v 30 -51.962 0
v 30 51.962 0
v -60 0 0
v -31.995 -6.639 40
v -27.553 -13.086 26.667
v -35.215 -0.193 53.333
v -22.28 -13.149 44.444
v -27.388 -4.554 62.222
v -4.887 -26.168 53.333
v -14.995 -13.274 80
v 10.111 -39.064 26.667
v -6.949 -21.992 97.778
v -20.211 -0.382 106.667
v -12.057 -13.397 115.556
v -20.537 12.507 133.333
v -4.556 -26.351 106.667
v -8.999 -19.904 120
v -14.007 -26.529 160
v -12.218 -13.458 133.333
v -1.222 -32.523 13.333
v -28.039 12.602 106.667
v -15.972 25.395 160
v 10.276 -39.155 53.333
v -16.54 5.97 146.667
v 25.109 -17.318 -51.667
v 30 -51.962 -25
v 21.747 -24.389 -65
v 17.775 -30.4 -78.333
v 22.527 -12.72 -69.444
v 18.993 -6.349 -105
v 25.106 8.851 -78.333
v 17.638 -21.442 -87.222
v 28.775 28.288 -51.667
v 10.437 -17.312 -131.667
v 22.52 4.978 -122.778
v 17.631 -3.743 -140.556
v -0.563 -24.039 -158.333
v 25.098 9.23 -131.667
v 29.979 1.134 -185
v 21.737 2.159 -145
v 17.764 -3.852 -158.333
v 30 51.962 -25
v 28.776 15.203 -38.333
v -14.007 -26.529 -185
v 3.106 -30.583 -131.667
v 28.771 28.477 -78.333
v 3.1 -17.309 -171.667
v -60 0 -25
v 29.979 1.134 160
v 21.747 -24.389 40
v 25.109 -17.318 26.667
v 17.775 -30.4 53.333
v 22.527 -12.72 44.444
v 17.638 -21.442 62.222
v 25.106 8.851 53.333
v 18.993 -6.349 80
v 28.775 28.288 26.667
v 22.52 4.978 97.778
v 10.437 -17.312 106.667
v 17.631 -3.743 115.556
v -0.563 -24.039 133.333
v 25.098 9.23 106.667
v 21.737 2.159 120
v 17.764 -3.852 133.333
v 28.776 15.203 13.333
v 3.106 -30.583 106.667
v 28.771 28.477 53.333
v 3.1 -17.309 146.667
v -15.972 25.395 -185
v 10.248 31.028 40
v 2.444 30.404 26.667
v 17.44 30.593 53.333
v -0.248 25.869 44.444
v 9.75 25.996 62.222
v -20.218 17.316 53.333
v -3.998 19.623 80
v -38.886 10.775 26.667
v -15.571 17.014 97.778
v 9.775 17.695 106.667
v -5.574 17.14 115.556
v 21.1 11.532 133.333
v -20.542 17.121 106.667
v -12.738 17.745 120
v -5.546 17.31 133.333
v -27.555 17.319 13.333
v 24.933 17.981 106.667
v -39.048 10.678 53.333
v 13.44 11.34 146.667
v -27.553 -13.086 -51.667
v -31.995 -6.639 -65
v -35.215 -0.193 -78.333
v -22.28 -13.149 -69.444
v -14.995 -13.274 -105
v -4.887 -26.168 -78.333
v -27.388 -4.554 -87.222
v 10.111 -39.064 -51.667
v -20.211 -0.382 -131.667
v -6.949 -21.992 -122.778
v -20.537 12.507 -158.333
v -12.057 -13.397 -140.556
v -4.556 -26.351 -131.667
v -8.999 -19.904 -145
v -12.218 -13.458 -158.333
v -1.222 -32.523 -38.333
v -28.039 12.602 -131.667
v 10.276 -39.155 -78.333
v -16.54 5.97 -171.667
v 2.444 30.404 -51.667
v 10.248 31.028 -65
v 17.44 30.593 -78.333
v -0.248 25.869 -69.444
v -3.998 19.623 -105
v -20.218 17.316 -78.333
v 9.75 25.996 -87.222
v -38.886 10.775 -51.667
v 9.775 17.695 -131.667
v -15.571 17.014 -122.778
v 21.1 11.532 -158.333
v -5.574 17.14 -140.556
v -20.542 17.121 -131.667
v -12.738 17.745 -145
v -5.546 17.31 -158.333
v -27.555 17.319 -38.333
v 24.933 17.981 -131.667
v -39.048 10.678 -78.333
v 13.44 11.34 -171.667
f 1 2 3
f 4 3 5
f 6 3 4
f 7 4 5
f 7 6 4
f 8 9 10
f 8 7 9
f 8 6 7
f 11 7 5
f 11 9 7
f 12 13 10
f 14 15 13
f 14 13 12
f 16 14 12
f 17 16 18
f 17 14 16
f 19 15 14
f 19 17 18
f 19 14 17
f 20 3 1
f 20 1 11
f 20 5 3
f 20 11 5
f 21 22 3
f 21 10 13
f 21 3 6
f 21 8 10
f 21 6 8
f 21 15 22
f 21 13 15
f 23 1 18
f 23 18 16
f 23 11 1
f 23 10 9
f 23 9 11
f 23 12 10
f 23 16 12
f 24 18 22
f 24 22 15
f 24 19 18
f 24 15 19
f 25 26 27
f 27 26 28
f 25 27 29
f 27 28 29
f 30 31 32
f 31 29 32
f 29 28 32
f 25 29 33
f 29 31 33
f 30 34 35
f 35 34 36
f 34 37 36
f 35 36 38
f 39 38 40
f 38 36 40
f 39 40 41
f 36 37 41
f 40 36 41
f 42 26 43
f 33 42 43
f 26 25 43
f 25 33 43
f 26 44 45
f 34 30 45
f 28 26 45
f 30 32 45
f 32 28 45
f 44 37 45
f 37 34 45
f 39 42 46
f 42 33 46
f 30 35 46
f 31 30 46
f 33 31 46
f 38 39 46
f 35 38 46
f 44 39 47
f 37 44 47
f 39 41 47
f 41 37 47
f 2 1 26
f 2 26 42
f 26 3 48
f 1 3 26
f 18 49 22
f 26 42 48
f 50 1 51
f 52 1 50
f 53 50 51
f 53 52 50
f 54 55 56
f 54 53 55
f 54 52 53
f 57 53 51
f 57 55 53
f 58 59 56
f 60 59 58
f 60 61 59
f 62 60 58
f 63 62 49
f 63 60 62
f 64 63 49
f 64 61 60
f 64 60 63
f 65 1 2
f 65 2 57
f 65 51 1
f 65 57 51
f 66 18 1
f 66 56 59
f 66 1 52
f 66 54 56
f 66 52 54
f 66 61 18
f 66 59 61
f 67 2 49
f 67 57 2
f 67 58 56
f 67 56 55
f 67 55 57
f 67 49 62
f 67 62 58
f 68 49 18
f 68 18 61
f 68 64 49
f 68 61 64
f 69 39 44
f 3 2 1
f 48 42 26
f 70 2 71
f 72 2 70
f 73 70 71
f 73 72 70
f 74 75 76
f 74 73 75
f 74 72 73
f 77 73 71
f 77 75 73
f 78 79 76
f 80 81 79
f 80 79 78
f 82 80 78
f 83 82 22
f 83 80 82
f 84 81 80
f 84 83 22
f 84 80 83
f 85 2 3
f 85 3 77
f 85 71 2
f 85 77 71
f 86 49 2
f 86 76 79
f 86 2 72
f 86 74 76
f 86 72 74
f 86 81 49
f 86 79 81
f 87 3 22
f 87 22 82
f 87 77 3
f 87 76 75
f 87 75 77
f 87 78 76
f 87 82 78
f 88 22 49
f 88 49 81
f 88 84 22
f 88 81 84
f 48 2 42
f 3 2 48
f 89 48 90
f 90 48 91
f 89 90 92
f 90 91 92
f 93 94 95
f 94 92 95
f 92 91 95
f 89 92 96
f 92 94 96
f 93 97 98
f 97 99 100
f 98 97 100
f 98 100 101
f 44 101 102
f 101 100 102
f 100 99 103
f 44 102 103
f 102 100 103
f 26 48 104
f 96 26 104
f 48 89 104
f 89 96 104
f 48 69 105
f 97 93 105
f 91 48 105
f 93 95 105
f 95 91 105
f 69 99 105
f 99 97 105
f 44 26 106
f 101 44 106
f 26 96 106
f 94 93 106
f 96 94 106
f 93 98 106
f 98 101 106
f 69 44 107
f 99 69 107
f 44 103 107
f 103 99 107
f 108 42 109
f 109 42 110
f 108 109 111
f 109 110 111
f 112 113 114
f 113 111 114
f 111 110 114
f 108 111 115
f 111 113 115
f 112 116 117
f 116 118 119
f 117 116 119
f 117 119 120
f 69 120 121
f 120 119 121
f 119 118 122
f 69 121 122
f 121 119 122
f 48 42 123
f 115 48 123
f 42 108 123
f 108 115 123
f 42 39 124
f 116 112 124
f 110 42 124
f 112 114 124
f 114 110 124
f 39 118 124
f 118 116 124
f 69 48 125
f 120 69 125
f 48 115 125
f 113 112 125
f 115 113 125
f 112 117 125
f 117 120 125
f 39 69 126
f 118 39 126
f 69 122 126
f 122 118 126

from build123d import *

# Parameters (mm, degrees)
F4_DEPTH = 25


with BuildPart() as f3:
    # F0 (on Top) → F3 section 0
    with BuildSketch(Plane.XY):
        Polygon((30, 51.9615242271), (-60, 0), (30, -51.9615242271), align=None)
    # F2 (on offset) → F3 section 1
    with BuildSketch(Plane.XY.offset(160)):
        Polygon((-15.9717522427, 25.3949430064), (-14.0067896499, -26.5294146883), (29.9785418925, 1.1344716819), align=None)
    loft()


with BuildPart() as f4:
    # F4 (new): a face of the model
    f4_faces = [f3.part.faces().sort_by_distance(p)[0] for p in [
        (0, 0, 0),
    ]]
    extrude(f4_faces, amount=F4_DEPTH)


with BuildPart() as f6_1:
    # F6: instance of F3
    add(f3.part.mirror(Plane(origin=(0, 0, -12.5), x_dir=(1, 0, 0), z_dir=(0, 0, -1))))


solid = Compound([f3.part, f4.part, f6_1.part])
